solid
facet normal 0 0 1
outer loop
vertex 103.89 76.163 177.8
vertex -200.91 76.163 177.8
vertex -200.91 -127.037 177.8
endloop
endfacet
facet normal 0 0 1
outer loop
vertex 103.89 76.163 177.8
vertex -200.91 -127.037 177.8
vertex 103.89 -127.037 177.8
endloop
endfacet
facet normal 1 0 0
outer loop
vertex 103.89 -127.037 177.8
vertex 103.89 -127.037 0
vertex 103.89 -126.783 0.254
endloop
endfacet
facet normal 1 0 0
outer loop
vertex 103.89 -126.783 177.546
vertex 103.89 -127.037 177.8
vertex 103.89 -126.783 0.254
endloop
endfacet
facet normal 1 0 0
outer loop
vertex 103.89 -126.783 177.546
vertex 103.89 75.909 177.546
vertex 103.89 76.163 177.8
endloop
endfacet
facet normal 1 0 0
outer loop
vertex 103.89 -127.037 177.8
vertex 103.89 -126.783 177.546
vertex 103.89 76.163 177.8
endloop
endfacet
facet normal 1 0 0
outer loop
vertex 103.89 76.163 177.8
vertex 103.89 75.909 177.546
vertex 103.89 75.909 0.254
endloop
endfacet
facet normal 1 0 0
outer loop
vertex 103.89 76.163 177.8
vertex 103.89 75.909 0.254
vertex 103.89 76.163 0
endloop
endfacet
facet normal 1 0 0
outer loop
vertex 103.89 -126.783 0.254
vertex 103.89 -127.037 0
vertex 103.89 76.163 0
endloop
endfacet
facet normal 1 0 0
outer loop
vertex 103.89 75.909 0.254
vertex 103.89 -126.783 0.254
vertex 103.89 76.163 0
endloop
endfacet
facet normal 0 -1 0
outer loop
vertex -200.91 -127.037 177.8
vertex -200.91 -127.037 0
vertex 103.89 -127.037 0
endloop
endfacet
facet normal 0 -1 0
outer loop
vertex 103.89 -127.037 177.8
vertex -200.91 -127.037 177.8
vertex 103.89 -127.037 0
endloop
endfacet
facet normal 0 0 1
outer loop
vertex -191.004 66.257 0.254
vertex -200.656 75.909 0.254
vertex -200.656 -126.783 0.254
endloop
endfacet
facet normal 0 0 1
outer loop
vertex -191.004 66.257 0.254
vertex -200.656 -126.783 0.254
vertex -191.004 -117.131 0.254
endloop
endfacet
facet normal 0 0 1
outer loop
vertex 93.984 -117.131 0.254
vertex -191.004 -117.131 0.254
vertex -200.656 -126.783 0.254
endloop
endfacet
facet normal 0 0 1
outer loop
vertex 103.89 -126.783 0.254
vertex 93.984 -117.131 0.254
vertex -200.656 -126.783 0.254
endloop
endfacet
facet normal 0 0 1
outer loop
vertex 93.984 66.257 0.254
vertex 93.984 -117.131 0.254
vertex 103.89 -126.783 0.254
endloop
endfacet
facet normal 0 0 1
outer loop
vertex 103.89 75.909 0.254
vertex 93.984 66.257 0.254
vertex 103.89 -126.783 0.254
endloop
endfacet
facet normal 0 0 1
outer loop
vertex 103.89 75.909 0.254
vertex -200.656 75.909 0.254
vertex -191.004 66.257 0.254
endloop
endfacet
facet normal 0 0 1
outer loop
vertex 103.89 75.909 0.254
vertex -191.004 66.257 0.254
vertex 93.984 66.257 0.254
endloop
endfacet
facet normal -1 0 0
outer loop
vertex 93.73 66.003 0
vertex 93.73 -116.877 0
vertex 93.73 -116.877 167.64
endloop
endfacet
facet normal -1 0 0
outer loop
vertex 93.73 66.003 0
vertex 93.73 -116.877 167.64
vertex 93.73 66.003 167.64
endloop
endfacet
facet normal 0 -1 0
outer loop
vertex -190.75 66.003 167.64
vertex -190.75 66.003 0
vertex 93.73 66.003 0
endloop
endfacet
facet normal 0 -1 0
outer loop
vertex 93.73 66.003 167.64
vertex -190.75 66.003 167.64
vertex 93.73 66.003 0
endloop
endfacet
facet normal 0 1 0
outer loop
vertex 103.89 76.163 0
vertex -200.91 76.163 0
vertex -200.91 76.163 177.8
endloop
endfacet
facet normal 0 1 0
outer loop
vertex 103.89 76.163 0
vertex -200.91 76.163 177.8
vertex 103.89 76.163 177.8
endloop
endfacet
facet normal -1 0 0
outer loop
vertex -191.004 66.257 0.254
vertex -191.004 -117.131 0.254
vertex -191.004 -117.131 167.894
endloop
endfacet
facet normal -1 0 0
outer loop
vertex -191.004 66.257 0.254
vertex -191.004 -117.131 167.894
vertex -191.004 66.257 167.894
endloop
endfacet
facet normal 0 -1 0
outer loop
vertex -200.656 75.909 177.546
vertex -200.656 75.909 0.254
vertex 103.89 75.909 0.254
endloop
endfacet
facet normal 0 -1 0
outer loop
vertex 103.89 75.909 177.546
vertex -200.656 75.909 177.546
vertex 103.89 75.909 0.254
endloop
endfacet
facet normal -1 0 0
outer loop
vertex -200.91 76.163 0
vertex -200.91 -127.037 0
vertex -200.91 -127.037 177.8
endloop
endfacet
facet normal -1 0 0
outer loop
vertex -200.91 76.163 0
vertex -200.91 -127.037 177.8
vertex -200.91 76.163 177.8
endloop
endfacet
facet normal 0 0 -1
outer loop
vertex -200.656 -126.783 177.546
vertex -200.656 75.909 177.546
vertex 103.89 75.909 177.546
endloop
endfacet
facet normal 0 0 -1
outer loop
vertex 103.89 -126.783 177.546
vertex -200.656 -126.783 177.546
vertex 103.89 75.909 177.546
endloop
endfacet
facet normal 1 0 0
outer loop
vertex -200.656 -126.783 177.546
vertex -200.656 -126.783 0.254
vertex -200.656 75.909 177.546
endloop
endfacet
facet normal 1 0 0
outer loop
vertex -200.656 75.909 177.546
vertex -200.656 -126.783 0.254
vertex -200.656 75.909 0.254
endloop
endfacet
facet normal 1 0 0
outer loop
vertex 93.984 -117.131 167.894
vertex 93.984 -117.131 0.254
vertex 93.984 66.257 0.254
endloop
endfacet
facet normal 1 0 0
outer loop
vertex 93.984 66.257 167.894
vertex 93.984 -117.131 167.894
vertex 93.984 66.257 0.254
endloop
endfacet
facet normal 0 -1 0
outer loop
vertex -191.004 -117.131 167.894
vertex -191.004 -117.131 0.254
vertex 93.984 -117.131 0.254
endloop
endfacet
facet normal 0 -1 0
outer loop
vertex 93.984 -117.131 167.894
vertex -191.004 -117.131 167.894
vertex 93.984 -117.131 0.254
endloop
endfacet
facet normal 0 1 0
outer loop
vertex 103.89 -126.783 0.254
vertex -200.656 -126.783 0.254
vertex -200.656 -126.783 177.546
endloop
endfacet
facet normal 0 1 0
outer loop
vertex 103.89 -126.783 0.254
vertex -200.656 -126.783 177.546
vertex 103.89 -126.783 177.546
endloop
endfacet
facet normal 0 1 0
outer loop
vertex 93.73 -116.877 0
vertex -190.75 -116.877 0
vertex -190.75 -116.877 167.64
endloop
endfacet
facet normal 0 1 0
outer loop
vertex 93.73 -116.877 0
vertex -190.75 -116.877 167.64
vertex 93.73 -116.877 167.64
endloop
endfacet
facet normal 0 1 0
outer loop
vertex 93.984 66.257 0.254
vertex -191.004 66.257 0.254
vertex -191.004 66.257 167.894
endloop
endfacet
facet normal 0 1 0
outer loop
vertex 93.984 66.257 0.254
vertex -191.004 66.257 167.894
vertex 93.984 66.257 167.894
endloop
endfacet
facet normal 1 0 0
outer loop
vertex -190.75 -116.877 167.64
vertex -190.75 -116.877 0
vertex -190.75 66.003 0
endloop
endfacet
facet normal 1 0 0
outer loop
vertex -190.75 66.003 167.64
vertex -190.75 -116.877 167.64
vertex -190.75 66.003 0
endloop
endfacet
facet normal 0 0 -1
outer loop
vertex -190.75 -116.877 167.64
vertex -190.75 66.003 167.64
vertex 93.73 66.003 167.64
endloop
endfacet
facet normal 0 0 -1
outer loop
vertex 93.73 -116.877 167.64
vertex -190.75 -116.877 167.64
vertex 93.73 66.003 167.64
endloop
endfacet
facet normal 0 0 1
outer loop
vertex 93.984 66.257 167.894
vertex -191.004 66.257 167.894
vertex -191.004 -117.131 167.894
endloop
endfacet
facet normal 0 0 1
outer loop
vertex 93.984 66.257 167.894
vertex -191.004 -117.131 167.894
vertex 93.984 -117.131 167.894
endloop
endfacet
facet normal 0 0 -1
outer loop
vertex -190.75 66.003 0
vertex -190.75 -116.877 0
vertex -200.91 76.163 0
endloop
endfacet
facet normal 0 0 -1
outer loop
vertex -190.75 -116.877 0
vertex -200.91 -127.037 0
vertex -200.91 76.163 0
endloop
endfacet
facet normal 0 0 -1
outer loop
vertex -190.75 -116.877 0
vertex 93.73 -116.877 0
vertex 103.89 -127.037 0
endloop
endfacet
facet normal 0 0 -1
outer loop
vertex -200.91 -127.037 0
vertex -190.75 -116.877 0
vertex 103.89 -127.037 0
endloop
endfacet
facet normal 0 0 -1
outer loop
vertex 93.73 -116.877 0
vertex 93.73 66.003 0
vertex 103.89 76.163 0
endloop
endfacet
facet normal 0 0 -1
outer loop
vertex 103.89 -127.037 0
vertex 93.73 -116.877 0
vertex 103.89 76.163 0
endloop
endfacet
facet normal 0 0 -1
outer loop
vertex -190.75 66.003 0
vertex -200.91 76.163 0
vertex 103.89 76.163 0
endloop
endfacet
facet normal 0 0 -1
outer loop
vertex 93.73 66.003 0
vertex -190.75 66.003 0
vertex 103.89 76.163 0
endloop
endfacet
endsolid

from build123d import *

# Parameters (mm, degrees)
F0_W     = 304.8
F0_H     = 203.2
F1_DEPTH = 177.8
F2_T     = -10.16
F3_T     = -0.254


with BuildPart() as f1:
    # F0 (on Top) → F1 (new body)
    with BuildSketch(Plane.XY):
        with Locations((-48.5099423885, -25.4367205143)):
            Rectangle(F0_W, F0_H)
    extrude(amount=F1_DEPTH)

    # F2
    f2_openings = [f1.faces().sort_by_distance(p)[0] for p in [
        (-48.509942, -25.436721, 0),
    ]]
    offset(amount=F2_T, openings=f2_openings)

    # F3
    f3_openings = [f1.faces().sort_by_distance(p)[0] for p in [
        (103.890058, -25.436721, 88.9),
    ]]
    offset(amount=F3_T, openings=f3_openings, kind=Kind.INTERSECTION)


solid = f1.part
